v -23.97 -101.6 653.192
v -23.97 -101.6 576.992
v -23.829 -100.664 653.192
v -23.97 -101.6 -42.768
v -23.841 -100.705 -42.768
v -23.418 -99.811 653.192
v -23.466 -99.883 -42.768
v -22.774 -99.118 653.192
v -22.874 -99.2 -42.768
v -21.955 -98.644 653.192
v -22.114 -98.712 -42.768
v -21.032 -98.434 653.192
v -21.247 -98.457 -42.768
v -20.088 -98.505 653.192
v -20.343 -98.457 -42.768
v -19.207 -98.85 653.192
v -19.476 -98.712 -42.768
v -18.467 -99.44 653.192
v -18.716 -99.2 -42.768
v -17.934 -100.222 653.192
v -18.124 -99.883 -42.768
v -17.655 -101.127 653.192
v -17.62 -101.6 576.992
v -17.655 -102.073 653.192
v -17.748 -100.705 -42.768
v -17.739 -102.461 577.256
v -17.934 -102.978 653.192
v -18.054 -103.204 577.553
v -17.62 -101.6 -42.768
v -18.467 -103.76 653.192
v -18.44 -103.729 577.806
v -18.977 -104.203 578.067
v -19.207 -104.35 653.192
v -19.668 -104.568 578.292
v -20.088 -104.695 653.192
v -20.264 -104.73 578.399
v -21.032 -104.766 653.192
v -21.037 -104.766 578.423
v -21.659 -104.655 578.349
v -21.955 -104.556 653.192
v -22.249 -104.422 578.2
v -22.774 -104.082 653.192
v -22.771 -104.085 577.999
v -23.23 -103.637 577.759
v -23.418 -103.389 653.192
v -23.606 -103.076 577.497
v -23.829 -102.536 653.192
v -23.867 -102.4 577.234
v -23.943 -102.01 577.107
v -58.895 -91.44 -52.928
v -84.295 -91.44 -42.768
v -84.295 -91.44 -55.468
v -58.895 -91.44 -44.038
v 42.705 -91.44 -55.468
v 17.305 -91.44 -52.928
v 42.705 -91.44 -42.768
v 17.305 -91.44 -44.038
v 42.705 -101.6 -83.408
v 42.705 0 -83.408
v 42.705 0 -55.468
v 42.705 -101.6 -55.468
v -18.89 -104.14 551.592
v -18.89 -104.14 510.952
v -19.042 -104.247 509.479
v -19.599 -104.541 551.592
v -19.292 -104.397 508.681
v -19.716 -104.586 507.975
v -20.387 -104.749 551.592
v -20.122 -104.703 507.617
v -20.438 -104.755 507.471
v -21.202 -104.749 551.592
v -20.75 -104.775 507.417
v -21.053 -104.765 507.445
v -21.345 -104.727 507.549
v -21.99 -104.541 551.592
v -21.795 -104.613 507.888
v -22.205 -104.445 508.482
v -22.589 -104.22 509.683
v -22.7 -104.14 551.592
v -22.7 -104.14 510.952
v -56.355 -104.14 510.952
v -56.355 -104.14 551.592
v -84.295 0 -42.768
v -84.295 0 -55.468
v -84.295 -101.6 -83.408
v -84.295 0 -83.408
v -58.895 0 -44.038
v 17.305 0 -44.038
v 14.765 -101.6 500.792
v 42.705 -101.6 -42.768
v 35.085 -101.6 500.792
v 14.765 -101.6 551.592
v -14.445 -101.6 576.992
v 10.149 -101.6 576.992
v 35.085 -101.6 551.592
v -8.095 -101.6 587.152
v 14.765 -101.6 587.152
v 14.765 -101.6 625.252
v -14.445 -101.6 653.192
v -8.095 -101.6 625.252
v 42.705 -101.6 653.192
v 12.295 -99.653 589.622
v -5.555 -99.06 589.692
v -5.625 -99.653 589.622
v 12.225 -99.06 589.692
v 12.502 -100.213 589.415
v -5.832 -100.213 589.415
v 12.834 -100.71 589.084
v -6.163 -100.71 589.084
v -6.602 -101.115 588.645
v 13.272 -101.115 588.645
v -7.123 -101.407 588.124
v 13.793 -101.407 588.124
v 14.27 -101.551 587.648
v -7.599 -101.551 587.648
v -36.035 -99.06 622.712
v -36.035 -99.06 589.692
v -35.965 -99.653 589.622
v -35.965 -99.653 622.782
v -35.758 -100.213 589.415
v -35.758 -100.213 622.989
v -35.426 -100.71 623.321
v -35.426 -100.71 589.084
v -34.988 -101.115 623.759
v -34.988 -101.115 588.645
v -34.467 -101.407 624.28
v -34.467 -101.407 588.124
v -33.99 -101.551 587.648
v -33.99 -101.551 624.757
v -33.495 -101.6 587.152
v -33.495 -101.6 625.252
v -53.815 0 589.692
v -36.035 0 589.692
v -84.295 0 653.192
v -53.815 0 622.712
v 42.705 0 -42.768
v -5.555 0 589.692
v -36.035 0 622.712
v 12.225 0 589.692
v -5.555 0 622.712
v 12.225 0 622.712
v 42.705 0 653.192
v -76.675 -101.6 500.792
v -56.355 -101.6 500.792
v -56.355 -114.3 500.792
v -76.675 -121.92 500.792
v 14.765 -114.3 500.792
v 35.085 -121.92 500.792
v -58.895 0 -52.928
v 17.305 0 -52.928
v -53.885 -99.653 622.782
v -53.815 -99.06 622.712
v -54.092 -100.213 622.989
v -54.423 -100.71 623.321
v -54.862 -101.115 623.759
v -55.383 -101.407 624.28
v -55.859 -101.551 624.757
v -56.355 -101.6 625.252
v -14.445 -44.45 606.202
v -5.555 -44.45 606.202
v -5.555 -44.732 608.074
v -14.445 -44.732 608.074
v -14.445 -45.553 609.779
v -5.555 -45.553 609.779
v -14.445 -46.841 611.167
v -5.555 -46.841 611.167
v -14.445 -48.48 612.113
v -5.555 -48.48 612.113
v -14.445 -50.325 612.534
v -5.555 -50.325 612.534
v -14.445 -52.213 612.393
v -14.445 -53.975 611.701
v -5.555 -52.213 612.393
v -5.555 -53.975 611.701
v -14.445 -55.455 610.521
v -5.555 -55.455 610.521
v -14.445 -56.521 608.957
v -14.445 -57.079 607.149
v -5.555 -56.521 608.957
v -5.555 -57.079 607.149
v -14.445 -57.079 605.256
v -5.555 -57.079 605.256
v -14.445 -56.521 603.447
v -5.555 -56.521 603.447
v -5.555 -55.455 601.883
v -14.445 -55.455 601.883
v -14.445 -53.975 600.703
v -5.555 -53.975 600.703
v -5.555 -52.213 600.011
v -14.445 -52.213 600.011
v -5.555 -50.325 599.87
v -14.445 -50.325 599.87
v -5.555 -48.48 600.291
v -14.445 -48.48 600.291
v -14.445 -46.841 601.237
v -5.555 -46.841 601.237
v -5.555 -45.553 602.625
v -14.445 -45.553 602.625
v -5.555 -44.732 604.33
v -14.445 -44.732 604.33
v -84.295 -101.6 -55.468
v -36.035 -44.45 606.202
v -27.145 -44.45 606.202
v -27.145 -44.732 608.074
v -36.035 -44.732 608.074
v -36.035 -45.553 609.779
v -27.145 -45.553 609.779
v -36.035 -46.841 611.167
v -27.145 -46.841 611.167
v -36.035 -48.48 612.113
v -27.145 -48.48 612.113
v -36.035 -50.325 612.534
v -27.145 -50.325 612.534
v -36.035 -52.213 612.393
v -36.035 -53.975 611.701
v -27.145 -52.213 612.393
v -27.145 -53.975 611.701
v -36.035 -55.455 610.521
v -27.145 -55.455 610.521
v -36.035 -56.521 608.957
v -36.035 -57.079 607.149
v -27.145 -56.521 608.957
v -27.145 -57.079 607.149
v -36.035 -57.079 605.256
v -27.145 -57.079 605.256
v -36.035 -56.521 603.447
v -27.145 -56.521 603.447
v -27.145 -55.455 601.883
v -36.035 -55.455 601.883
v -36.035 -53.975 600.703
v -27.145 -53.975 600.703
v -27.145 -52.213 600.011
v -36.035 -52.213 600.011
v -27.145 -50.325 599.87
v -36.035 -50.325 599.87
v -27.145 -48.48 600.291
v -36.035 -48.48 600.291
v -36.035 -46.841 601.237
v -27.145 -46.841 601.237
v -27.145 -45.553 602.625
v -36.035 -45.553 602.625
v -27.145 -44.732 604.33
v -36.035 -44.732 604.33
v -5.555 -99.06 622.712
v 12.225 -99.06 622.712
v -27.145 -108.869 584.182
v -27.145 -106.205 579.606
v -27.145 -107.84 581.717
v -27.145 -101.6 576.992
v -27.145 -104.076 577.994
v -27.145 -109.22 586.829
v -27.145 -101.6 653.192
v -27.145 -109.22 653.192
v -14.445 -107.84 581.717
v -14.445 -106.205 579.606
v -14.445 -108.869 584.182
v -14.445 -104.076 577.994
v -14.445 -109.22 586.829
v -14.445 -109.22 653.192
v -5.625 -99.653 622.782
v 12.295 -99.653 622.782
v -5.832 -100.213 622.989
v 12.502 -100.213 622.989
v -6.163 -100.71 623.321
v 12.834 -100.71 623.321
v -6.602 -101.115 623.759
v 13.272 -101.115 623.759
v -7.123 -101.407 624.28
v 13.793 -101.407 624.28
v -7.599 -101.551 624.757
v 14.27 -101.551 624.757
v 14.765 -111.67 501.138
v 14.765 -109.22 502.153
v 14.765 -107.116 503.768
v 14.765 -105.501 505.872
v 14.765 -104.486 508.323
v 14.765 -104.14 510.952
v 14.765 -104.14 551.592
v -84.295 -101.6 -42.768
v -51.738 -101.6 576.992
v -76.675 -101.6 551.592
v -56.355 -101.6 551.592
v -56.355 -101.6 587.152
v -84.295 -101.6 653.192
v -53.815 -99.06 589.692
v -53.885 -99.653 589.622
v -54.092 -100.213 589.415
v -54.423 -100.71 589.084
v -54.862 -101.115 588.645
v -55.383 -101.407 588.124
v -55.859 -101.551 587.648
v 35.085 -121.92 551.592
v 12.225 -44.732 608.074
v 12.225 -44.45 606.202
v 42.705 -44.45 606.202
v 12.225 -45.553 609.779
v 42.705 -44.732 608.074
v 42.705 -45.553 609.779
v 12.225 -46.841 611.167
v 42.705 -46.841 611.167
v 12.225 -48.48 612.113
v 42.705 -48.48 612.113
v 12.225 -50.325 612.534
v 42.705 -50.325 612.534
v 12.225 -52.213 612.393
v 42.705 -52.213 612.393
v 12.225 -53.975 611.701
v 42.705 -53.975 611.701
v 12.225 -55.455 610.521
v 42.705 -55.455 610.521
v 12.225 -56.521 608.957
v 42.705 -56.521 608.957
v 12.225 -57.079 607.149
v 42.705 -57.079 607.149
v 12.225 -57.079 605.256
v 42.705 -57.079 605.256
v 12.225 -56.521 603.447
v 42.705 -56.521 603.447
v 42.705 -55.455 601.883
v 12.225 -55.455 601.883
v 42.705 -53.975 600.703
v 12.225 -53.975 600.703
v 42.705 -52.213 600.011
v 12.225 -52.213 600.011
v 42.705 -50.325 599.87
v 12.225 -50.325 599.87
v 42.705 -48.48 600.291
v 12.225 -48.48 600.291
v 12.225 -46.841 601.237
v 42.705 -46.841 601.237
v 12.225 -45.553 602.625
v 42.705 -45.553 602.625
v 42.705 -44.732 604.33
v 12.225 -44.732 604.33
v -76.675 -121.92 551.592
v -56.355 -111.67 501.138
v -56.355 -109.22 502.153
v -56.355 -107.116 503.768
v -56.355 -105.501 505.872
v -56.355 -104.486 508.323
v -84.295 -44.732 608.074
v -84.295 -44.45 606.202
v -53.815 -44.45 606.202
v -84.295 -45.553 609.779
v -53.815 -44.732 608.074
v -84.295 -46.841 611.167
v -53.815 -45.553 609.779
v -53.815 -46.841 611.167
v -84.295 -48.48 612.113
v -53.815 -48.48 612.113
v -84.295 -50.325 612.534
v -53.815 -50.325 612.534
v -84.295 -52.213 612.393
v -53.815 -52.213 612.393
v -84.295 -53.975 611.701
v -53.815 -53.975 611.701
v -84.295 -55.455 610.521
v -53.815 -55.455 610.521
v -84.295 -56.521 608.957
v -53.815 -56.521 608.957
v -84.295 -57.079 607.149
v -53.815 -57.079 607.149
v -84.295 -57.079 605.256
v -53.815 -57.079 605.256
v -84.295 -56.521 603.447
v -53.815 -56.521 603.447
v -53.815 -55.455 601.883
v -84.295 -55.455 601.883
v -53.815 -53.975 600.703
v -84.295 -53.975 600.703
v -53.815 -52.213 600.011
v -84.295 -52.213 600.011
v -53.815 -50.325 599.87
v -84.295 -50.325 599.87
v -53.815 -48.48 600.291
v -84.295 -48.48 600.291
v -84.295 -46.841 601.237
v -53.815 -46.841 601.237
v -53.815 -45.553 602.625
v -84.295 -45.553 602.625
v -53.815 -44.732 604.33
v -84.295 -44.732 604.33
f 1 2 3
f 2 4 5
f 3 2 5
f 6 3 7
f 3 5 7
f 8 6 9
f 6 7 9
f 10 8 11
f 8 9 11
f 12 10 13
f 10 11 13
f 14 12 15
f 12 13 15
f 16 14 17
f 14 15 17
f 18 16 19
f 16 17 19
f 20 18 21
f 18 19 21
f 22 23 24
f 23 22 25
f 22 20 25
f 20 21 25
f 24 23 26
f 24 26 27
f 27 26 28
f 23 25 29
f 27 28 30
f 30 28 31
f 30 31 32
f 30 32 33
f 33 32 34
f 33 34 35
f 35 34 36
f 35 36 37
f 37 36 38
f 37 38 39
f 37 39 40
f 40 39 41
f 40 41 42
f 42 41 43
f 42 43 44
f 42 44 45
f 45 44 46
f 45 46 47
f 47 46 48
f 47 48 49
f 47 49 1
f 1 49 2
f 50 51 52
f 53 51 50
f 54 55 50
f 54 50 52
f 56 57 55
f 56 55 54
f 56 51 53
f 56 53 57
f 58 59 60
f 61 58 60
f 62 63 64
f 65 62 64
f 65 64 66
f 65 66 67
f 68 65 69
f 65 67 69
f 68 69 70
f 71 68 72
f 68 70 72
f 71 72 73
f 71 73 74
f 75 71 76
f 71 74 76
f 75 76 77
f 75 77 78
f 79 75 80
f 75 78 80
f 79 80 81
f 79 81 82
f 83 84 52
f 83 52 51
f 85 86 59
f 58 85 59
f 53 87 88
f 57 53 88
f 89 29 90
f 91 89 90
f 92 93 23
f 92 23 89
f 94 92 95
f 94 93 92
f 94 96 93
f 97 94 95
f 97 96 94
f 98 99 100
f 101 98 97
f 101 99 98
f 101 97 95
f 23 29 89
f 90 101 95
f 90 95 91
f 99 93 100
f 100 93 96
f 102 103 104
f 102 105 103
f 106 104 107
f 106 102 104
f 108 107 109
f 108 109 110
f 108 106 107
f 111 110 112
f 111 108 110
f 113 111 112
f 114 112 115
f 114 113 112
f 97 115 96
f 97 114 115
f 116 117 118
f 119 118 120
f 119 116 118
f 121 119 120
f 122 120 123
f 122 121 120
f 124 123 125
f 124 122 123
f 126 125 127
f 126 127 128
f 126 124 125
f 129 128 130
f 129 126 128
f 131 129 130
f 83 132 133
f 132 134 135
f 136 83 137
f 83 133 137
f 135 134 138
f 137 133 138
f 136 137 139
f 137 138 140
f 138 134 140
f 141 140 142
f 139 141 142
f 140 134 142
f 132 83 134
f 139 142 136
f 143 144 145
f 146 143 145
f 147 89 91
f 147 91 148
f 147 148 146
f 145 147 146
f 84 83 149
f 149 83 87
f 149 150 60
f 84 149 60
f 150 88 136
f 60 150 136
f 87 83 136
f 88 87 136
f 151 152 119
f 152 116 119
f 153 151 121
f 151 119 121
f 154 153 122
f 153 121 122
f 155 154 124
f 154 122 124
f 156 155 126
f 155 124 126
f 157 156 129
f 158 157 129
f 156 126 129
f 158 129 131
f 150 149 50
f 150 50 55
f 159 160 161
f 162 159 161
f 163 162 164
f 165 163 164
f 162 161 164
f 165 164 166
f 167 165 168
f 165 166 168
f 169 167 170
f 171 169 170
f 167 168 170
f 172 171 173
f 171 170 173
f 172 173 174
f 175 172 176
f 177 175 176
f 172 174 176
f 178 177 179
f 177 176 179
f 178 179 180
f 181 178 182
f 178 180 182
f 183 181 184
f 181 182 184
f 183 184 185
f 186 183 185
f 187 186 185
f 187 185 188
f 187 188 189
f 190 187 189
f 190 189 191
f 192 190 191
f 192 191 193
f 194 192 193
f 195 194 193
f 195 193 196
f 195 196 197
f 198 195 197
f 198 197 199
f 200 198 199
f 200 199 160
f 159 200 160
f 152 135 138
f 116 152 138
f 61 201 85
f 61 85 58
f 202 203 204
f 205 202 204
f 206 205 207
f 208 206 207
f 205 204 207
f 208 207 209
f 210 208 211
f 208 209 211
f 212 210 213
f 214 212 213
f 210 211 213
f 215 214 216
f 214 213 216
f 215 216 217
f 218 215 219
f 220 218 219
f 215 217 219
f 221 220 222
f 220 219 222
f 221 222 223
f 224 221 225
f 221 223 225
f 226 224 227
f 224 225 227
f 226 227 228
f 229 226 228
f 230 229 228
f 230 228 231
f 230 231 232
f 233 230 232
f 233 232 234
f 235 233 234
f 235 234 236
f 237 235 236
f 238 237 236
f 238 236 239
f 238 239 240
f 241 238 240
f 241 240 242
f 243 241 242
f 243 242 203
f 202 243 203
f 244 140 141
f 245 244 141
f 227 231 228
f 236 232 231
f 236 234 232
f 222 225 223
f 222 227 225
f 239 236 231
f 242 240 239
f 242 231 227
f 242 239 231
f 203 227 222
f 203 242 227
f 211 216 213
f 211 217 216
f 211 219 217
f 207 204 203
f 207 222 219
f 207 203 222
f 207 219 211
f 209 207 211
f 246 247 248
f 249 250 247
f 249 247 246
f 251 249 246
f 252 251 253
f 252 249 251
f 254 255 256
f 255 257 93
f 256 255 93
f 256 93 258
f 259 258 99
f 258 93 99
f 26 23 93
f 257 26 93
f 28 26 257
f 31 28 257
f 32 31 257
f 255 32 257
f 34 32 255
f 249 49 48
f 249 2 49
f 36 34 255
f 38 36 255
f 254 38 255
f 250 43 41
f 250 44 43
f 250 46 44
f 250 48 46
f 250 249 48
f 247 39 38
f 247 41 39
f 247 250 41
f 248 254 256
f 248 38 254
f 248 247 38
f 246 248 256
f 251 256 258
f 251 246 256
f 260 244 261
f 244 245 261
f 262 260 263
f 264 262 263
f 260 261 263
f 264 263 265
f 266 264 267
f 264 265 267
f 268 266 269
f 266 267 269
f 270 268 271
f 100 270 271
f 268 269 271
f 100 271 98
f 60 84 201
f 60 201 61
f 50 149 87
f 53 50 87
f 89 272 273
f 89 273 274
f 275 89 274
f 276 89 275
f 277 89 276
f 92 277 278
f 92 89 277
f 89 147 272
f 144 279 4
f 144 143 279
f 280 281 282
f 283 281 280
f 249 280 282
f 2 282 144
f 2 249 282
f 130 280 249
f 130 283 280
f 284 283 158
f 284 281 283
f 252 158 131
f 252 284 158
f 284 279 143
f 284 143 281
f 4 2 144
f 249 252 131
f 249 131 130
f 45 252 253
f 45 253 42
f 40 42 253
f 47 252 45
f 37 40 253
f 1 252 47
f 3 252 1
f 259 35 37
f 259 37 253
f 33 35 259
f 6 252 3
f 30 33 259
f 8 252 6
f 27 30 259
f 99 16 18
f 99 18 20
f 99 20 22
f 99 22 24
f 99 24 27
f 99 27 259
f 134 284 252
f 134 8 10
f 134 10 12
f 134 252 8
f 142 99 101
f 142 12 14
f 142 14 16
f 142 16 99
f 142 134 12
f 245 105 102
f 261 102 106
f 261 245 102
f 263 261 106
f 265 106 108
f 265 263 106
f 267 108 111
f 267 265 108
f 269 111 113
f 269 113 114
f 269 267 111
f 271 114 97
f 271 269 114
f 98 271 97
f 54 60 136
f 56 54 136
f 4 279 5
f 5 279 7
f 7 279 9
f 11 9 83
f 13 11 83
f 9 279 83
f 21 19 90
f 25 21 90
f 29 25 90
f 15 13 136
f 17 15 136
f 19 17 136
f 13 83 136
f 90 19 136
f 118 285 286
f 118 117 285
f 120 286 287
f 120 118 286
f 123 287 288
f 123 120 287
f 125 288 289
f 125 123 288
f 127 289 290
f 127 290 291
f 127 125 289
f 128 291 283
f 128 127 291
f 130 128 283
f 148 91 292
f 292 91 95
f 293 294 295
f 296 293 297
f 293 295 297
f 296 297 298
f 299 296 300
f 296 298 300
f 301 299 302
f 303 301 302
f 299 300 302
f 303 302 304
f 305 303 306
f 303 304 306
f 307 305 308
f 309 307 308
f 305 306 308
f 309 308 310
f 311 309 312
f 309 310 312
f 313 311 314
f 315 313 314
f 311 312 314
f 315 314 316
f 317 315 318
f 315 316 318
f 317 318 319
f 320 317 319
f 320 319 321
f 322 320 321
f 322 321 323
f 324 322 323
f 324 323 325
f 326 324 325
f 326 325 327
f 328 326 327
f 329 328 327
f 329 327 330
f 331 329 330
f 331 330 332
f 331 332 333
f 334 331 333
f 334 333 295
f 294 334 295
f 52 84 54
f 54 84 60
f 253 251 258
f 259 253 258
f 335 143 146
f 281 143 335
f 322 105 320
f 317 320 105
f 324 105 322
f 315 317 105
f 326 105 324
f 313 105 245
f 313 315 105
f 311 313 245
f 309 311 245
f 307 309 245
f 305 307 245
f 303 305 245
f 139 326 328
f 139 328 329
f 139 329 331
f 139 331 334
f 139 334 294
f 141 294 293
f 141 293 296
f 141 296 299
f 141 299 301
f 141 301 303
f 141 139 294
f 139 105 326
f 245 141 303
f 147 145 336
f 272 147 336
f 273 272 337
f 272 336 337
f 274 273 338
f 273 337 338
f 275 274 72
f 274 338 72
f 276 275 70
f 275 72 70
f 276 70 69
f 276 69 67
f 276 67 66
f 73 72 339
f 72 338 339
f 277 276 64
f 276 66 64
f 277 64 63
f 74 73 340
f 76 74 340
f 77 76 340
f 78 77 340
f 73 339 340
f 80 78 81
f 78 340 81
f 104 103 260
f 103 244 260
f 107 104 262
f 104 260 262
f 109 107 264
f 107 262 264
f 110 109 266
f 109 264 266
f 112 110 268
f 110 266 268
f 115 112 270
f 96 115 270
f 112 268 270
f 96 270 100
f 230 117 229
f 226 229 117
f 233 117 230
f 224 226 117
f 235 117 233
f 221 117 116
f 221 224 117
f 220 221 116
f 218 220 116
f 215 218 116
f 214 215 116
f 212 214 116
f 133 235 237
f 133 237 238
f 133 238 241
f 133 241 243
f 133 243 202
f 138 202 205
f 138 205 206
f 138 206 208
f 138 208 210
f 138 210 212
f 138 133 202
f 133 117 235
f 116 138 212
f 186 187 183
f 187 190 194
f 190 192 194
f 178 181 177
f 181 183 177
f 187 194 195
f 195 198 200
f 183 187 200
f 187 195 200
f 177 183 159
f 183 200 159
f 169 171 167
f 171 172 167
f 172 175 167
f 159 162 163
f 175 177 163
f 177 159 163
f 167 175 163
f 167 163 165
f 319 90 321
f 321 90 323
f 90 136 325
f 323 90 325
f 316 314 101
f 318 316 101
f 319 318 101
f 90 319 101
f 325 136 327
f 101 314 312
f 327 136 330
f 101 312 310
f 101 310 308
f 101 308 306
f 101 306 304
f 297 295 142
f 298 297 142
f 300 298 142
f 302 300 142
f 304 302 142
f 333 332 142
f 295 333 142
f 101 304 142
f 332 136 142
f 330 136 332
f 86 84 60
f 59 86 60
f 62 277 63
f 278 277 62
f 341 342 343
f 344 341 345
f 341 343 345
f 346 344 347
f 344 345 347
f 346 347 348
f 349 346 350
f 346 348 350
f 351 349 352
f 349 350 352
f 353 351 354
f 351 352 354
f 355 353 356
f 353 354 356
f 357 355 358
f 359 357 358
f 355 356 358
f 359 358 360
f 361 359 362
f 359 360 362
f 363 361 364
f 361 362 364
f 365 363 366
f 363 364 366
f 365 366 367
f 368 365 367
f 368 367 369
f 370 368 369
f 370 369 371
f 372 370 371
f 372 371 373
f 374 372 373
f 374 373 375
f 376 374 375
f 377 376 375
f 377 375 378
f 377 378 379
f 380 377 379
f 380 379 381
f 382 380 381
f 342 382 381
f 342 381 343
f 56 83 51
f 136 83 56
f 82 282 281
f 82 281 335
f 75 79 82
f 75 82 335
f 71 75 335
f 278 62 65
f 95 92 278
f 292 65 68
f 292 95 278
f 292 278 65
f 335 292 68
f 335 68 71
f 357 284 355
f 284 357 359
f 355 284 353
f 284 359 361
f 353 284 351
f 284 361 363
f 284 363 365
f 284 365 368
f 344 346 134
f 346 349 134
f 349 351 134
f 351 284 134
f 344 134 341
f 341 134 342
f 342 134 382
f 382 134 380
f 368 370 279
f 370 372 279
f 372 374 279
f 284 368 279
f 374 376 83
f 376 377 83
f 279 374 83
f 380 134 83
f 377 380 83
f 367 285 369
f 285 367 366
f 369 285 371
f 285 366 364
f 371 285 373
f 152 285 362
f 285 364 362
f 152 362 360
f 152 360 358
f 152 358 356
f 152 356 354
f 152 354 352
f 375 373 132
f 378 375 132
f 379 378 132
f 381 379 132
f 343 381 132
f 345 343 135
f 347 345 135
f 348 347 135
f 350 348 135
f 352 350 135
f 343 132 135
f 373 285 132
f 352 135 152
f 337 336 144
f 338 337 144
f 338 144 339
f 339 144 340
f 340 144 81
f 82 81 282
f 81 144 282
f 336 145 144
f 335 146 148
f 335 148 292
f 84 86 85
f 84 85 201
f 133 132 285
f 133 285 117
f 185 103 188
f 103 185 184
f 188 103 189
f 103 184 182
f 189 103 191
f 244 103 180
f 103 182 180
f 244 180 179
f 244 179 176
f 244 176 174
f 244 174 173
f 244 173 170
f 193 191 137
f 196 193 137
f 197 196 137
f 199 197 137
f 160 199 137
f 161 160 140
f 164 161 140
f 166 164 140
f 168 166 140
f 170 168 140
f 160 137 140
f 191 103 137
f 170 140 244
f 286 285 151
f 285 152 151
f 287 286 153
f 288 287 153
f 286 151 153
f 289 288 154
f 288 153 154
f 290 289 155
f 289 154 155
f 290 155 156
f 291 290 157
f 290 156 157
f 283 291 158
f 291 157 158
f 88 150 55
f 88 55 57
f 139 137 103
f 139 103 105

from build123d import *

# Parameters (mm, degrees)
F0_W         = 127
F0_H         = 27.94
F1_DEPTH     = 101.6
F0_W_2       = 20.32
F0_H_2       = 50.8
F0_W_3       = 57.15
F0_H_3       = 76.2
F0_W_4       = 17.78
F0_H_4       = 33.02
F3_R         = 2.54
F0_H_5       = 12.7
F0_W_5       = 76.2
F0_H_6       = 8.89
F4_DEPTH     = 91.44
F6_D         = 12.7
F6_DEPTH     = 693.42
F6_TIP       = 3.8154649308
F0_W_6       = 12.7
F7_DEPTH     = 109.22
F8_T1_DEPTH  = 61.8868884968
F9_DEPTH     = 121.92
F10_W        = 17.78
F10_H        = 50.8
F11_DEPTH    = 71.12
F12_D        = 6.35
F12_DEPTH    = 701.04
F12_TIP      = 1.9077324654
F13_T1_DEPTH = 59.055
F13_T3_DEPTH = 59.055


# Not quite as in the source:
# - a fillet or chamfer that OpenCascade refuses, or shapes differently, is made with other operations: its cross-section is extruded or revolved along the edge and cut away or added
# - a feature names something its author has since deleted; it is built from what else it names


with BuildPart() as f1:
    # F0 (on Front) → F1 (new body)
    with BuildSketch(Plane.XZ):
        with Locations((-20.794781892, -69.4378848389)):
            Rectangle(F0_W, F0_H)
    extrude(amount=F1_DEPTH)


with BuildPart() as f1b:
    # F0 (on Front) → F1, piece 2 (new body)
    with BuildSketch(Plane.XZ):
        Polygon((-27.144781892, 576.9921151611), (-84.294781892, 576.9921151611), (-84.294781892, -42.7678848389), (42.705218108, -42.7678848389), (42.705218108, 576.9921151611), (-14.444781892, 576.9921151611), align=None)
        with Locations((-66.514781892, 526.1921151611)):
            Rectangle(F0_W_2, F0_H_2, mode=Mode.SUBTRACT)
        with Locations((24.925218108, 526.1921151611)):
            Rectangle(F0_W_2, F0_H_2, mode=Mode.SUBTRACT)
        with Locations((14.130218108, 615.0921151611)):
            Rectangle(F0_W_3, F0_H_3)
        with Locations((3.335218108, 606.2021151611)):
            Rectangle(F0_W_4, F0_H_4, mode=Mode.SUBTRACT)
        with Locations((-55.719781892, 615.0921151611)):
            Rectangle(F0_W_3, F0_H_3)
        with Locations((-44.924781892, 606.2021151611)):
            Rectangle(F0_W_4, F0_H_4, mode=Mode.SUBTRACT)
    extrude(amount=F1_DEPTH)

    # F3
    f3_edges = [f1b.edges().sort_by_distance(p)[0] for p in [
        (12.225218, -101.6, 606.202115),
        (3.335218, -101.6, 589.692115),
        (-5.554782, -101.6, 606.202115),
        (3.335218, -101.6, 622.712115),
        (-36.034782, -101.6, 606.202115),
        (-44.924782, -101.6, 622.712115),
        (-53.814782, -101.6, 606.202115),
        (-44.924782, -101.6, 589.692115),
    ]]
    fillet(f3_edges, radius=F3_R)

    # F6
    with Locations(Plane(origin=(-84.294781892, 0, 0), x_dir=(0, -1, 0), z_dir=(-1, 0, 0))):
        with Locations((50.8, 606.2021151611)):
            Hole(F6_D / 2, depth=F6_DEPTH)
            with Locations((0, 0, -(F6_DEPTH + F6_TIP / 2))):  # 118° drill point
                Cone(0, F6_D / 2, F6_TIP, mode=Mode.SUBTRACT)

    # F0 (on Front) → F7 (join)
    with BuildSketch(Plane.XZ):
        with Locations((-20.794781892, 615.0921151611)):
            Rectangle(F0_W_6, F0_H_3)
    extrude(amount=F7_DEPTH)

    # F8: fillet of radius 10.16 on 1 edges, made by hand

    # F8_s2 → F8_t1 (cut)
    with BuildSketch(Plane.YZ.offset(-51.7382261404)):
        with BuildLine():
            ThreePointArc((-101.6, 576.9921151611), (-107.0921852568, 580.6077889138), (-109.22, 586.8294928604))
            Line((-109.22, 586.8294928604), (-109.22, 576.9921151611))
            Line((-109.22, 576.9921151611), (-101.6, 576.9921151611))
        make_face()
    extrude(amount=F8_T1_DEPTH, mode=Mode.SUBTRACT)

    # F0 (on Front) → F9 (join)
    with BuildSketch(Plane.XZ):
        with Locations((24.925218108, 526.1921151611)):
            Rectangle(F0_W_2, F0_H_2)
        with Locations((-66.514781892, 526.1921151611)):
            Rectangle(F0_W_2, F0_H_2)
    extrude(amount=F9_DEPTH)

    # F10 (on face) → F11 (join)
    with BuildSketch(Plane(origin=(14.765218108, 0, 0), x_dir=(0, -1, 0), z_dir=(-1, 0, 0))):
        with Locations((113.03, 526.1921151611)):
            Rectangle(F10_W, F10_H)
    extrude(amount=F11_DEPTH)

    # F12
    with Locations(Plane.XY.offset(653.1921151611)):
        with Locations((-20.794781892, -101.6)):
            Hole(F12_D / 2, depth=F12_DEPTH)
            with Locations((0, 0, -(F12_DEPTH + F12_TIP / 2))):  # 118° drill point
                Cone(0, F12_D / 2, F12_TIP, mode=Mode.SUBTRACT)

    # F13: fillet of radius 10.16 on 2 edges, made by hand

    # F13_s2 → F13_t1 (cut)
    with BuildSketch(Plane.YZ.offset(-56.354781892)):
        with BuildLine():
            ThreePointArc((-114.3, 500.7921151611), (-107.1157951031, 503.7679102642), (-104.14, 510.9521151611))
            Line((-104.14, 510.9521151611), (-104.14, 500.7921151611))
            Line((-104.14, 500.7921151611), (-114.3, 500.7921151611))
        make_face()
    extrude(amount=F13_T1_DEPTH, mode=Mode.SUBTRACT)

    # F13_s4 → F13_t3 (cut)
    with BuildSketch(Plane.YZ.offset(-44.289781892)):
        with BuildLine():
            ThreePointArc((-114.3, 500.7921151611), (-107.1157951031, 503.7679102642), (-104.14, 510.9521151611))
            Line((-104.14, 510.9521151611), (-104.14, 500.7921151611))
            Line((-104.14, 500.7921151611), (-114.3, 500.7921151611))
        make_face()
    extrude(amount=F13_T3_DEPTH, mode=Mode.SUBTRACT)


with BuildPart() as f4:
    # F0 (on Front) → F4 (new body)
    with BuildSketch(Plane.XZ):
        with Locations((-20.794781892, -49.1178848389)):
            Rectangle(F0_W, F0_H_5)
        with Locations((-20.794781892, -48.4828848389)):
            Rectangle(F0_W_5, F0_H_6, mode=Mode.SUBTRACT)
    extrude(amount=F4_DEPTH)


solid = Compound([f1.part, f1b.part, f4.part])
